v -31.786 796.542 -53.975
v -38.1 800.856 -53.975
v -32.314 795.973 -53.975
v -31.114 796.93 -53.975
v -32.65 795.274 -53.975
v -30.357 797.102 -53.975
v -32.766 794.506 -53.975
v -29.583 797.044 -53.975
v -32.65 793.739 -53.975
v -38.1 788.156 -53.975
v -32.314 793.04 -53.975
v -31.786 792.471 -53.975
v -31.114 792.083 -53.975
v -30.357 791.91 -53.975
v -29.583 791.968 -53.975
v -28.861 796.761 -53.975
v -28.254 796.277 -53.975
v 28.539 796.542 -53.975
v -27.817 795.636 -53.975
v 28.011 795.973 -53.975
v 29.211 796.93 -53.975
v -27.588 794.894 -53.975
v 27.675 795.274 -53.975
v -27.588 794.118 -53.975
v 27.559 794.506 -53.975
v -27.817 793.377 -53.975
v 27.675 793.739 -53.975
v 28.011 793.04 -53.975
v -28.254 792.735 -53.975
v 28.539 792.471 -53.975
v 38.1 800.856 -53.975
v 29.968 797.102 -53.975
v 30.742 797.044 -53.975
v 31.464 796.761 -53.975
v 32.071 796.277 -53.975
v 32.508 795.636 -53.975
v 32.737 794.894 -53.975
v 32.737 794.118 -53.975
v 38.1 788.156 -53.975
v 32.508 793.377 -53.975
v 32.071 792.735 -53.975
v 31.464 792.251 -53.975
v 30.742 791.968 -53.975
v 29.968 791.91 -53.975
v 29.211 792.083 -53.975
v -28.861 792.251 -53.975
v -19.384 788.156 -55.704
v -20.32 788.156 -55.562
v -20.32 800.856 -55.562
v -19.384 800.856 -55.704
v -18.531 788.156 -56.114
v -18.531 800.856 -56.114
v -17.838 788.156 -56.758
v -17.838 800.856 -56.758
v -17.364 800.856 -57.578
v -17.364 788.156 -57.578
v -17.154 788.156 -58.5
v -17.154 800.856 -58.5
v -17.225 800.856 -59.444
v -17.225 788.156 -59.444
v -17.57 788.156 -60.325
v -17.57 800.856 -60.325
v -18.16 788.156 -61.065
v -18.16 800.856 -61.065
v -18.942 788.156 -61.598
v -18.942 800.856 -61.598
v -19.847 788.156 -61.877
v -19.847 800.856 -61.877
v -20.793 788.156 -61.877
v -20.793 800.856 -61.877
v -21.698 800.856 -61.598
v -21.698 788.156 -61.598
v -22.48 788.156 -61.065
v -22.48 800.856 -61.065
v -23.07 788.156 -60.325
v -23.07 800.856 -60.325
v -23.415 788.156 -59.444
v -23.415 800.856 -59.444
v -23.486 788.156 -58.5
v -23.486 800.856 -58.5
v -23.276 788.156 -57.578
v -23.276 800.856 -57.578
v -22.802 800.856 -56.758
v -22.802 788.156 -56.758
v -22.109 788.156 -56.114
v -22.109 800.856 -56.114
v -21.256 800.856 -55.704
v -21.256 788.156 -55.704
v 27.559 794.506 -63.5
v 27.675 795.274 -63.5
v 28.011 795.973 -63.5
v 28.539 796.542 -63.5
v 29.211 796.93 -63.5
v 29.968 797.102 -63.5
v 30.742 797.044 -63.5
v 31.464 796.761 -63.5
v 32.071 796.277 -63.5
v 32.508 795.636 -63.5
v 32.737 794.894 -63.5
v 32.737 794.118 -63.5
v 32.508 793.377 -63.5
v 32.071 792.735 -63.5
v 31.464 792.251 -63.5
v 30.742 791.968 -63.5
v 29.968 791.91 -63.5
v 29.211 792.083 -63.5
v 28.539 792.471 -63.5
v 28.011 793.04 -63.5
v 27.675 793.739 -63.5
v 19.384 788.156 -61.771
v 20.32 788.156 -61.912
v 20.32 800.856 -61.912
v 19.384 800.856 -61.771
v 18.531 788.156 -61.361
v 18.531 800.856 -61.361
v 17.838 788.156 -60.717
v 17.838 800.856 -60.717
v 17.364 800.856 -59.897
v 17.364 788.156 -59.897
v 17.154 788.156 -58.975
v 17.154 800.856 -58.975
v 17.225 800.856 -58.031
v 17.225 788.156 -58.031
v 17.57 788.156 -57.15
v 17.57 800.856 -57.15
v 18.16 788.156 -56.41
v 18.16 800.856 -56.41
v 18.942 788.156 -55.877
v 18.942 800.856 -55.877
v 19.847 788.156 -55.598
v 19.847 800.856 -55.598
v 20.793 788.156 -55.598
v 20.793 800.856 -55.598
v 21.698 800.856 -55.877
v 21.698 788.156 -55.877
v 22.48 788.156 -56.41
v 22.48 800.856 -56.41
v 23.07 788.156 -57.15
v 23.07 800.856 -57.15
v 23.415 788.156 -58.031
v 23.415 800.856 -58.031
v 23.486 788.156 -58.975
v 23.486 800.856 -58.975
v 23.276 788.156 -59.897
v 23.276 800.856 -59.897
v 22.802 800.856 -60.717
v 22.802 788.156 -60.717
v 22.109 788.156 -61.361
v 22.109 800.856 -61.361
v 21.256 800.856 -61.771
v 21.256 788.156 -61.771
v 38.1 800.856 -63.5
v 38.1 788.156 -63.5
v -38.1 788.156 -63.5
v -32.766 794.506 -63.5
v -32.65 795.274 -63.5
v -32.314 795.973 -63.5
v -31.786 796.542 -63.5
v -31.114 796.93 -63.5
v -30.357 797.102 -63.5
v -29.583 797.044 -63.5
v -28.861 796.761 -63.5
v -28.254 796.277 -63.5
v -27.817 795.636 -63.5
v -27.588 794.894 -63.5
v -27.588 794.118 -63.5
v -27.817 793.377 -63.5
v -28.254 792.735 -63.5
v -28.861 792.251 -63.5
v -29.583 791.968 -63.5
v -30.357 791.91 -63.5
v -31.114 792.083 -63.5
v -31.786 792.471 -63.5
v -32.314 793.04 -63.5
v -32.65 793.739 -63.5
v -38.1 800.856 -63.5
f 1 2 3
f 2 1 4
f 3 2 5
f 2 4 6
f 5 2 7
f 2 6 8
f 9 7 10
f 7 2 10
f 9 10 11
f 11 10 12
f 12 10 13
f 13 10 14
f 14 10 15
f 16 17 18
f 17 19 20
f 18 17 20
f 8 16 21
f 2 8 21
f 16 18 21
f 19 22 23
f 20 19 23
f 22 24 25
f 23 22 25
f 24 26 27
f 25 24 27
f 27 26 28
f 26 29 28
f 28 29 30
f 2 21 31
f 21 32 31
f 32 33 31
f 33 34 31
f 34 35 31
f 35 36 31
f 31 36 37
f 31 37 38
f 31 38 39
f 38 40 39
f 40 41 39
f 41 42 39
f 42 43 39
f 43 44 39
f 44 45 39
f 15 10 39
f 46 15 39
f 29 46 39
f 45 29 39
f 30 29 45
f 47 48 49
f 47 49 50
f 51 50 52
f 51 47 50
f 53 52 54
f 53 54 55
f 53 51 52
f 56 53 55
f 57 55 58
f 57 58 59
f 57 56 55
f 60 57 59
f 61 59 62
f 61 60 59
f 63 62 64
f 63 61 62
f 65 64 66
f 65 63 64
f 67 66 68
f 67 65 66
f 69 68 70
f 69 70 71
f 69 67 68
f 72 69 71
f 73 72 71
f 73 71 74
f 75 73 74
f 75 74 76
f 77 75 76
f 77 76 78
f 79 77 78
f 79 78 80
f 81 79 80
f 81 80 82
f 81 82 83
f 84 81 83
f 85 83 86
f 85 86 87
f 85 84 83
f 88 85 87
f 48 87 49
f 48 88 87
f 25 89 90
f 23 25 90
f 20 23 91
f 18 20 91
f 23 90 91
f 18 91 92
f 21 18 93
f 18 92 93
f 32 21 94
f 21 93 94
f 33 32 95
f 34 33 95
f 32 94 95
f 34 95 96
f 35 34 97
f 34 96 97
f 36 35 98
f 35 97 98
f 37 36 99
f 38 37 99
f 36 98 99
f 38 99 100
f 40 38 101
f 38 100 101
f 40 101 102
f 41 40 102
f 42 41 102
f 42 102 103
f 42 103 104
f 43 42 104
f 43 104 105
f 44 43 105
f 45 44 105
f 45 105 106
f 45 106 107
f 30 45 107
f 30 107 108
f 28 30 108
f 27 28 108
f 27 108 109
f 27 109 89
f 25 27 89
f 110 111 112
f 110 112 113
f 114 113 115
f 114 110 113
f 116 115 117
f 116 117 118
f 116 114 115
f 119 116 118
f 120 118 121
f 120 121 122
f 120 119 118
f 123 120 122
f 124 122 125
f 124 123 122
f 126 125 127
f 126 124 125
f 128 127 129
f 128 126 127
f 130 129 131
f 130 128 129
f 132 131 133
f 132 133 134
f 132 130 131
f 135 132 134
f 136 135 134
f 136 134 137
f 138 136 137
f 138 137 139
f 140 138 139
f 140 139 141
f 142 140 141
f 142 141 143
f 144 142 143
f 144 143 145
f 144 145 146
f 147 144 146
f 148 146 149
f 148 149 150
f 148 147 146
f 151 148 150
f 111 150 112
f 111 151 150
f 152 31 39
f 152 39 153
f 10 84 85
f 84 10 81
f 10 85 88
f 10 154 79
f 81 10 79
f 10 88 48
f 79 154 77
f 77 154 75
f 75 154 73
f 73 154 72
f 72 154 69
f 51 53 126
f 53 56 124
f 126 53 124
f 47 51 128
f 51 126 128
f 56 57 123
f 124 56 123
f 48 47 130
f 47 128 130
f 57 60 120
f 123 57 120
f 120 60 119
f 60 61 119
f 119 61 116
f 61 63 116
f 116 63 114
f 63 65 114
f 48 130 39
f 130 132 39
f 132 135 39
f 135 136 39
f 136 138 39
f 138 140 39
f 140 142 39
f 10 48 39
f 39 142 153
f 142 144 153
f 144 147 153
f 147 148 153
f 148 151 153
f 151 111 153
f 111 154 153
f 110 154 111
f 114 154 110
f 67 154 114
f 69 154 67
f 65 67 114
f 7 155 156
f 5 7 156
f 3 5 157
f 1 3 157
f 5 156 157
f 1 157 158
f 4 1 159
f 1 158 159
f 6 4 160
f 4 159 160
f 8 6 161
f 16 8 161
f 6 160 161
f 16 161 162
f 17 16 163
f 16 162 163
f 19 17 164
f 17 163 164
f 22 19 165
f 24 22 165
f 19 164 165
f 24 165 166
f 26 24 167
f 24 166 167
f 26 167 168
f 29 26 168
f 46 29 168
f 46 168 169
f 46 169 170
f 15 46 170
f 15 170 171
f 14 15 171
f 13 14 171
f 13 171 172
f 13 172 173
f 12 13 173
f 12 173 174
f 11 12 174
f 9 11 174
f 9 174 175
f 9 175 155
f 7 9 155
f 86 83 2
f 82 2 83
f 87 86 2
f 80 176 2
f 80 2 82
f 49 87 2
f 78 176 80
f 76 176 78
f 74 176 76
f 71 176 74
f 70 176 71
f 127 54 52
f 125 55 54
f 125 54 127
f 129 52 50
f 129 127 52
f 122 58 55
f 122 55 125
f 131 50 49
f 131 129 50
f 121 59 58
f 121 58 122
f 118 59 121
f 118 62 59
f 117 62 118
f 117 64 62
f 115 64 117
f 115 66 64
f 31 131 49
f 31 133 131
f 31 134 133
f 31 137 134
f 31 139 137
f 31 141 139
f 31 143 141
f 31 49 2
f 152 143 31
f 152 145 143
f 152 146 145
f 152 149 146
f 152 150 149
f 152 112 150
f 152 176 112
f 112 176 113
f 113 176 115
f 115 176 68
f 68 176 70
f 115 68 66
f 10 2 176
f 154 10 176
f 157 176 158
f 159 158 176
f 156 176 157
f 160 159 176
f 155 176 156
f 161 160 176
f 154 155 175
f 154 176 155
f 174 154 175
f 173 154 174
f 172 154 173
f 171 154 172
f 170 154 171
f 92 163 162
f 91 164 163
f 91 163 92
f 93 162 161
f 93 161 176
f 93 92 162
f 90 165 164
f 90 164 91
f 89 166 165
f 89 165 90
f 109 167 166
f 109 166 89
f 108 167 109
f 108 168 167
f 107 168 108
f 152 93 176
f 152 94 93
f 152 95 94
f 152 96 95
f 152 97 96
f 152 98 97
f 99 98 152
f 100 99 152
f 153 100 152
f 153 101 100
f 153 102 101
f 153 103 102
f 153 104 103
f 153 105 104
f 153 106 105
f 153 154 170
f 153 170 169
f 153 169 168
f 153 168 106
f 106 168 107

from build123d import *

# Parameters (mm, degrees)
SKETCH1_W           = 76.2
SKETCH1_H           = 9.525
SKETCH1_R           = 3.175
BOSS_EXTRUDE1_DEPTH = 12.7
CUT_EXTRUDE1_REACH  = 803.818
SKETCH2_R           = 2.6035


with BuildPart() as part:
    # Sketch1 → Boss-Extrude1 (new body)
    with BuildSketch(Plane(origin=(0, 788.156140976, 0), x_dir=(1, 0, 0), z_dir=(0, 1, 0))):
        with Locations((0, 58.7375)):
            Rectangle(SKETCH1_W, SKETCH1_H)
        with Locations(Location((-20.32, 58.7375, 0), (0, 0, 270))):
            Circle(SKETCH1_R, mode=Mode.SUBTRACT)
        with Locations(Location((20.32, 58.7375, 0), (0, 0, 90))):
            Circle(SKETCH1_R, mode=Mode.SUBTRACT)
    extrude(amount=BOSS_EXTRUDE1_DEPTH)

    # Sketch2 → Cut-Extrude1 (cut, up to next)
    with BuildSketch(Plane(origin=(0, 0, -63.5), x_dir=(-1, 0, 0), z_dir=(0, 0, -1)), mode=Mode.PRIVATE) as cut_extrude1_sk1:
        with Locations((30.1625, 794.506140976)):
            Circle(SKETCH2_R)
    cut_extrude1_tool1 = extrude(cut_extrude1_sk1.sketch, amount=-CUT_EXTRUDE1_REACH, mode=Mode.PRIVATE) & part.part
    # Sketch2 → Cut-Extrude1 (cut, up to next)
    with BuildSketch(Plane(origin=(0, 0, -63.5), x_dir=(-1, 0, 0), z_dir=(0, 0, -1)), mode=Mode.PRIVATE) as cut_extrude1_sk2:
        with Locations((-30.1625, 794.506140976)):
            Circle(SKETCH2_R)
    cut_extrude1_tool2 = extrude(cut_extrude1_sk2.sketch, amount=-CUT_EXTRUDE1_REACH, mode=Mode.PRIVATE) & part.part
    add(cut_extrude1_tool1.solids().sort_by_distance((-30.1625, 794.506141, -63.5))[0], mode=Mode.SUBTRACT)
    add(cut_extrude1_tool2.solids().sort_by_distance((30.1625, 794.506141, -63.5))[0], mode=Mode.SUBTRACT)


solid = part.part
